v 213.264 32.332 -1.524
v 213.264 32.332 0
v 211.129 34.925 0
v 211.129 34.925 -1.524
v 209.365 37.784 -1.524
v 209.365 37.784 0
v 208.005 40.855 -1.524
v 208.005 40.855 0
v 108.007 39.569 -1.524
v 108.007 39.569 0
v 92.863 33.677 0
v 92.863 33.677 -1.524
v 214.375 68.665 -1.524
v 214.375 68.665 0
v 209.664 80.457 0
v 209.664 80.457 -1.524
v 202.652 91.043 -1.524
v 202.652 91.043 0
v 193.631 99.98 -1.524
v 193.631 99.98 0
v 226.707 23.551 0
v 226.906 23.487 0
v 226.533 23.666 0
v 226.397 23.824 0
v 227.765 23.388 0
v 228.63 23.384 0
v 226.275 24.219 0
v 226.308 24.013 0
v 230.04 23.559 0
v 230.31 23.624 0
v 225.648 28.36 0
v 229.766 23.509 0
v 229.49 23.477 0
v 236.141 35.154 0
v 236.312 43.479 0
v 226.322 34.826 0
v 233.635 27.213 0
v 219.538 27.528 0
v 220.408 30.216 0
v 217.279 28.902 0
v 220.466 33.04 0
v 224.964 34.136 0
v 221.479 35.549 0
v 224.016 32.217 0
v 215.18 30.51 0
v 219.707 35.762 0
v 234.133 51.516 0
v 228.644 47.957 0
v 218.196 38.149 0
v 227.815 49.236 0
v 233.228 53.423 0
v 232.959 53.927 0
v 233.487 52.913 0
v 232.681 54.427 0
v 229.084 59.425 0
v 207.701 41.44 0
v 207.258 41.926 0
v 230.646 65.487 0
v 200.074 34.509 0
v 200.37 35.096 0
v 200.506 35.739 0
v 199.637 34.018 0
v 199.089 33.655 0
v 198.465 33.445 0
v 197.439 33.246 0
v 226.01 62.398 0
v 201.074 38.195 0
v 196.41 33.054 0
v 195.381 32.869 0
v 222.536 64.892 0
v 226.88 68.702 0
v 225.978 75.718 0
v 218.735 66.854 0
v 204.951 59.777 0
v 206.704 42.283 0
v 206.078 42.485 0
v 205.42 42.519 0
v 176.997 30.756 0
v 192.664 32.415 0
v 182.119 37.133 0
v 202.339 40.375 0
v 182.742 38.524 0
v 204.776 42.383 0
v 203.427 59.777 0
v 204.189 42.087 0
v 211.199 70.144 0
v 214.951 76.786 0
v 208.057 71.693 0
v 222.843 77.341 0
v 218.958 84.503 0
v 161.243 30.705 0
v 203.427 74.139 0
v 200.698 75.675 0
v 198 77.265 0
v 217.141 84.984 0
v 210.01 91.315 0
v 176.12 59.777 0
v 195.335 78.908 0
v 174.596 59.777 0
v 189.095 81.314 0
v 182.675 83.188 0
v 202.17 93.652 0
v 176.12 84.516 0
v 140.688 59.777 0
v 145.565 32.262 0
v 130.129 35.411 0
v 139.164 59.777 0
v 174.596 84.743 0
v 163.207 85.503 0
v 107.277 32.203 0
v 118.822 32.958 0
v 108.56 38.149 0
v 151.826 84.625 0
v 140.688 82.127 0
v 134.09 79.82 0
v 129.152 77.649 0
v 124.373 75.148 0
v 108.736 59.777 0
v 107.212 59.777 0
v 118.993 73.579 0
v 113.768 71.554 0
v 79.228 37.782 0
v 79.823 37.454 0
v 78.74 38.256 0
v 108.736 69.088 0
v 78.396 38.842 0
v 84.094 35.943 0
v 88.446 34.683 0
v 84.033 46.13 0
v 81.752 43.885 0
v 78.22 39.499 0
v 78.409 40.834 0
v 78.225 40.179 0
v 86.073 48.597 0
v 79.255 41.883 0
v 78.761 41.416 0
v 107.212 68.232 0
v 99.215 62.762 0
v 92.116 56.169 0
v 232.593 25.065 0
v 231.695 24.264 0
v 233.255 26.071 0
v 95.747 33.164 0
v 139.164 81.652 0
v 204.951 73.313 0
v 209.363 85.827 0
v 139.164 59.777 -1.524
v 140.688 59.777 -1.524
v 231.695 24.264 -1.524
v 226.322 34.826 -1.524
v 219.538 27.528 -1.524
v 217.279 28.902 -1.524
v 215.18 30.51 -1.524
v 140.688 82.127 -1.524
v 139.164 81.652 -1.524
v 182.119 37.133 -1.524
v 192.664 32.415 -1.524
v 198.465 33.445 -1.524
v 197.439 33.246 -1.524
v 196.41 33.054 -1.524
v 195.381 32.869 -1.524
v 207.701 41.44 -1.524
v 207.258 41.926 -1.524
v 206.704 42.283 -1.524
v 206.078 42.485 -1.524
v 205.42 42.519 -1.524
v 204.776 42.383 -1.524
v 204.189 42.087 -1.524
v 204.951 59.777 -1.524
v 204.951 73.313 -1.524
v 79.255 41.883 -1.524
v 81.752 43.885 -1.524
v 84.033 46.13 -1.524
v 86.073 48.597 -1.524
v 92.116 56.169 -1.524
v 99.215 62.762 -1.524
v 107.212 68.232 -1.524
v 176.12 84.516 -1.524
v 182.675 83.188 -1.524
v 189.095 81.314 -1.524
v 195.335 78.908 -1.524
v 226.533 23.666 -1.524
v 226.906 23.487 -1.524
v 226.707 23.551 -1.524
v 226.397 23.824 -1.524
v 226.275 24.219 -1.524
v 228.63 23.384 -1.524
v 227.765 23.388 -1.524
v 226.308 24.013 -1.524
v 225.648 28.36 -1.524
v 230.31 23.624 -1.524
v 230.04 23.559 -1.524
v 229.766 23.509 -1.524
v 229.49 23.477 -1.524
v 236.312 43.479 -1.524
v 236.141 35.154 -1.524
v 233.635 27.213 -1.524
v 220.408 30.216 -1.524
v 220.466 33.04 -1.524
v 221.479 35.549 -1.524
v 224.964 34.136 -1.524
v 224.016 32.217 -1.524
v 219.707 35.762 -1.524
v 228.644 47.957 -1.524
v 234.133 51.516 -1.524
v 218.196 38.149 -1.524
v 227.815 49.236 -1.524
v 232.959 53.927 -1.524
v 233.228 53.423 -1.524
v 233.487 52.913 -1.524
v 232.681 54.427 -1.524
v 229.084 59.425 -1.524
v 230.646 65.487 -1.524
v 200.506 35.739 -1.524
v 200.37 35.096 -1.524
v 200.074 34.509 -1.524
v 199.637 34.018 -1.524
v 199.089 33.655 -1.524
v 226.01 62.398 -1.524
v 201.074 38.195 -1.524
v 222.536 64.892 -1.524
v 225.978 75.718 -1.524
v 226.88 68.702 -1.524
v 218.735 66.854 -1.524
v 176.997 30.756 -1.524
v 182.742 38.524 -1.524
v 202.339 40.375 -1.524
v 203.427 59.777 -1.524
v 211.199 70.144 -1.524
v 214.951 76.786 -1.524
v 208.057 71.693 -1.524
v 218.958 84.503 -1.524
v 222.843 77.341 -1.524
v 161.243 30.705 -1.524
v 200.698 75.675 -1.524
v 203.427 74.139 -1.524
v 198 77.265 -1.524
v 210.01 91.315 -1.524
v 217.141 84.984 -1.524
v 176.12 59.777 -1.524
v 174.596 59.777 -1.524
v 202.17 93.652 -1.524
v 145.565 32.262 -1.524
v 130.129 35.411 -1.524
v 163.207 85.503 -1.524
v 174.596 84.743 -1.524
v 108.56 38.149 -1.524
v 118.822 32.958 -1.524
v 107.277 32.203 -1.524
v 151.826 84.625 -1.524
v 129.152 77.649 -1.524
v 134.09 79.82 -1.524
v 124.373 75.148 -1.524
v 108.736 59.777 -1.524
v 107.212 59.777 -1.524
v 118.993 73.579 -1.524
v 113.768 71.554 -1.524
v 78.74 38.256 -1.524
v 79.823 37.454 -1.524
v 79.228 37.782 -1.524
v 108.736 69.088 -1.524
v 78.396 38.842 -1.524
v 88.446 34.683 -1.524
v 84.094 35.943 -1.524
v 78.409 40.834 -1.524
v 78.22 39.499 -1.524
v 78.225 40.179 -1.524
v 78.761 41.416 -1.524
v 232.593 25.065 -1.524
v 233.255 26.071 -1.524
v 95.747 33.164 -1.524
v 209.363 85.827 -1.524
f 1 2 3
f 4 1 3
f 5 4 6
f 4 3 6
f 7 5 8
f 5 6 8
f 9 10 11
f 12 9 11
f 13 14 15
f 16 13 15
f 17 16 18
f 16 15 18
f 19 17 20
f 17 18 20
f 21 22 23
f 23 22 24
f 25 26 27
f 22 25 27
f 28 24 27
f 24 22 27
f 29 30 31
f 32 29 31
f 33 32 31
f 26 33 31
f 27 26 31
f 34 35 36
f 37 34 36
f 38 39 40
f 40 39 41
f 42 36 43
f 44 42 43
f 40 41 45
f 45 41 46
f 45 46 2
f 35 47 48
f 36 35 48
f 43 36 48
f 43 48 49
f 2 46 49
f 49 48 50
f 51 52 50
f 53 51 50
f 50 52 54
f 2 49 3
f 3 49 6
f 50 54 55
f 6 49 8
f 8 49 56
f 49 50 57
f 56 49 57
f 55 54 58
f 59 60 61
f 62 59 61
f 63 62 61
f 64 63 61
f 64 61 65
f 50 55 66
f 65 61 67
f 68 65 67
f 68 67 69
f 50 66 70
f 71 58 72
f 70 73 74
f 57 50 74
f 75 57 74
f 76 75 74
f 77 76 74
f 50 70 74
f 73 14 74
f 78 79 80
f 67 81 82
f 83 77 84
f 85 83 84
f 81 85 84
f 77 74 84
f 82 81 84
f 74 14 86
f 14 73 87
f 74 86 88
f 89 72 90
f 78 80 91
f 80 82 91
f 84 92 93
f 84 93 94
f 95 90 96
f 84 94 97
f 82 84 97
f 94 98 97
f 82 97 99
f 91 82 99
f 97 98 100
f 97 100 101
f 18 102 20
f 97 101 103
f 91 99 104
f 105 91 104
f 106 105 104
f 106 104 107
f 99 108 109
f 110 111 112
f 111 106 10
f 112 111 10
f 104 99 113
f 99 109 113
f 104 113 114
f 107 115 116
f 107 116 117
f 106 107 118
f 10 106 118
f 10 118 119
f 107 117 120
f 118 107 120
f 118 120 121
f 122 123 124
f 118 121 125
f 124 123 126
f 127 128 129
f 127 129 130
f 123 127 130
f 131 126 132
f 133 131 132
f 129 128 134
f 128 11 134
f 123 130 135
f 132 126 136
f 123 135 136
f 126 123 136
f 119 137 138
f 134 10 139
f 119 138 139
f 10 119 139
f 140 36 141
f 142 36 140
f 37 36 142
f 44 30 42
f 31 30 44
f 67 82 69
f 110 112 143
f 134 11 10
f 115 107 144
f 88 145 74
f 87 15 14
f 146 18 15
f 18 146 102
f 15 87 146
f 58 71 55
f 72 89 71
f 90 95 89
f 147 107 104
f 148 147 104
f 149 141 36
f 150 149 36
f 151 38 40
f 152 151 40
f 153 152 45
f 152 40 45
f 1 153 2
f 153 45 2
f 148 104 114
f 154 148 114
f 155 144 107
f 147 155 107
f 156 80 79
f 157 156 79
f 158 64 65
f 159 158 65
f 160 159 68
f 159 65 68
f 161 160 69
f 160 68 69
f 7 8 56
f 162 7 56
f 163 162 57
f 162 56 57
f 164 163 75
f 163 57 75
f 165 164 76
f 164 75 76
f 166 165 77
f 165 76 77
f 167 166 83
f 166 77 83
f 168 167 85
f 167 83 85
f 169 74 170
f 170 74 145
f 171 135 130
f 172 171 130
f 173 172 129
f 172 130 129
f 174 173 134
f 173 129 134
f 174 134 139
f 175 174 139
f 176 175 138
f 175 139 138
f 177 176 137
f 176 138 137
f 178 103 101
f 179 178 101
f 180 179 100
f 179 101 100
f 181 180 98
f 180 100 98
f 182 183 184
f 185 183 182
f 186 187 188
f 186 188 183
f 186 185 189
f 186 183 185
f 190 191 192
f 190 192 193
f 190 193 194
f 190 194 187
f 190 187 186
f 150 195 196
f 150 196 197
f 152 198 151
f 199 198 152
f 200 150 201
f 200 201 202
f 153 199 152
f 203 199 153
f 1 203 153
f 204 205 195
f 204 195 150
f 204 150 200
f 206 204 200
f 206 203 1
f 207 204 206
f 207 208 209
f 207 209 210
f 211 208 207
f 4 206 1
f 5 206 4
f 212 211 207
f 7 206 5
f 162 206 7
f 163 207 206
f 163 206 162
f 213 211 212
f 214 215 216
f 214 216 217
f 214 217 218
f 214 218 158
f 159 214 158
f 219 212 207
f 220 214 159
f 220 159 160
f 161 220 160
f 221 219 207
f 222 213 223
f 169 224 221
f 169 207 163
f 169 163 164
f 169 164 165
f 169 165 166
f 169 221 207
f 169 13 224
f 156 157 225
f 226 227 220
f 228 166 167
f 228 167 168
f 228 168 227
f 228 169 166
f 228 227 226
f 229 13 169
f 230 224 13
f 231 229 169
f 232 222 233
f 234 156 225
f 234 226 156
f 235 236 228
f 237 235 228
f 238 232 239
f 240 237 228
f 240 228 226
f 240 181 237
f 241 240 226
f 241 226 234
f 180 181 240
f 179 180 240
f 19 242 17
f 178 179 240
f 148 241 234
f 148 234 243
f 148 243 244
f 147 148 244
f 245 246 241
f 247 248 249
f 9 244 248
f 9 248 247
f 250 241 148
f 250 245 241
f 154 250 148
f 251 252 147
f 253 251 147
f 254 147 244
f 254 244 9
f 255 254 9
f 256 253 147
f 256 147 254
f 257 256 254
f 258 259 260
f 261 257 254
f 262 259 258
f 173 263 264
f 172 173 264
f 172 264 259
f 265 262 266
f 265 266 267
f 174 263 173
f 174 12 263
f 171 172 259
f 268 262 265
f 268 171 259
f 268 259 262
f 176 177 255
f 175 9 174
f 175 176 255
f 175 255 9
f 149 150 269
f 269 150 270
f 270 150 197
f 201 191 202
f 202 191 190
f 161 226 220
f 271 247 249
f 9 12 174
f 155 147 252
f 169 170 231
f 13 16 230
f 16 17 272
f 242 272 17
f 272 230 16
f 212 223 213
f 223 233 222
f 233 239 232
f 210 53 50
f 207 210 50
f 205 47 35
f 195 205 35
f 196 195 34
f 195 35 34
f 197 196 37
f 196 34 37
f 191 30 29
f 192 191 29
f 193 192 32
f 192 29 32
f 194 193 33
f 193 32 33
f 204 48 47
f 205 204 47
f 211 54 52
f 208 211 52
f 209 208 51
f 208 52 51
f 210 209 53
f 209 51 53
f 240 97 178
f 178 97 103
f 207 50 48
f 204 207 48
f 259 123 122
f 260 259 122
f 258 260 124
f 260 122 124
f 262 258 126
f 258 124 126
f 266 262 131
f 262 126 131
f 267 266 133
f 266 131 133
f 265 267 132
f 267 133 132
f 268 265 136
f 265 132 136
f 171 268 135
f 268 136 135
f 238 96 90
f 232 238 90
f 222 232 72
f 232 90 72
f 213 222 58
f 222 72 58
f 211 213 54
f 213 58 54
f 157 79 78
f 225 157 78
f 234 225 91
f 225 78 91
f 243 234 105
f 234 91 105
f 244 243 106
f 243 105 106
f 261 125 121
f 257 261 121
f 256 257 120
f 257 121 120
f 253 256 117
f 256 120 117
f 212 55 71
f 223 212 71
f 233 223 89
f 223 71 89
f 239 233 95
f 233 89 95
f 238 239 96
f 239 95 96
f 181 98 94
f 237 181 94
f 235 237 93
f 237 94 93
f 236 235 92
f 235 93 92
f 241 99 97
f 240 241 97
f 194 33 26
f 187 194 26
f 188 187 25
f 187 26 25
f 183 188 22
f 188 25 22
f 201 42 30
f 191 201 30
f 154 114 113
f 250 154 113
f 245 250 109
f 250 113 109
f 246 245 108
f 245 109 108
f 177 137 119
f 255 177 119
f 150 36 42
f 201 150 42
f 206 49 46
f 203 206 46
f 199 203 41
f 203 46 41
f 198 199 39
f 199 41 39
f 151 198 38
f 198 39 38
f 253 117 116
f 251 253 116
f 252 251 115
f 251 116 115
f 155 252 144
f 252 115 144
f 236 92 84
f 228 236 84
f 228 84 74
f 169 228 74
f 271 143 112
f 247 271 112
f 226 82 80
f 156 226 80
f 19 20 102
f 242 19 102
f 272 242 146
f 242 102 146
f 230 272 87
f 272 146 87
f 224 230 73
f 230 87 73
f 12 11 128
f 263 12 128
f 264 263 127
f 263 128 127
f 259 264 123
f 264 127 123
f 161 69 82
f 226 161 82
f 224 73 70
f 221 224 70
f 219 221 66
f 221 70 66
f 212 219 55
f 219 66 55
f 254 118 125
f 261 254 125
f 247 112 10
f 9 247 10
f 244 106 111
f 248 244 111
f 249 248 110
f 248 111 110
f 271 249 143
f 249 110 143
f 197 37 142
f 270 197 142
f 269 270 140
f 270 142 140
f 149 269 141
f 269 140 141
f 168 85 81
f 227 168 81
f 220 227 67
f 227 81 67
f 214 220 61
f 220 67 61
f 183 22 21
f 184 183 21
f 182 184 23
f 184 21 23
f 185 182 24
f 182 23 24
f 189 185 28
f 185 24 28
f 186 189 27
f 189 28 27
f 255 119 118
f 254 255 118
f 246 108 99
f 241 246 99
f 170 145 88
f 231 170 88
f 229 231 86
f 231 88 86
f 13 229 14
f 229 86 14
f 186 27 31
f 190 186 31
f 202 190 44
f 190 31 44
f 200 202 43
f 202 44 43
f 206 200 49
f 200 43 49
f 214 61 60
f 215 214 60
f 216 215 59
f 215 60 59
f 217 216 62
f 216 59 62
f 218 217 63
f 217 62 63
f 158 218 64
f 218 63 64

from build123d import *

# Parameters (mm, degrees)
BASE_FLANGE1_DEPTH = 1.524


# Sheet-metal steps are written as plain solids
with BuildPart() as part:
    # Sketch1 → Base-Flange1 (new body)
    with BuildSketch(Plane.XY):
        with BuildLine():
            Line((231.694733782, 24.263932463), (226.322343195, 34.826415896))
            Line((226.322343195, 34.826415896), (224.963957286, 34.135500761))
            Line((224.963957286, 34.135500761), (230.310366707, 23.62409806))
            ThreePointArc((230.310366707, 23.62409806), (229.903279587, 23.531939933), (229.489552508, 23.476777012))
            ThreePointArc((229.489552508, 23.476777012), (228.197526273, 23.373669283), (226.906388141, 23.487358857))
            ThreePointArc((226.906388141, 23.487358857), (226.4596517, 23.740258206), (226.274712745, 24.219141398))
            ThreePointArc((226.274712745, 24.219141398), (224.015809297, 32.216773888), (218.195630565, 38.14891429))
            ThreePointArc((218.195630565, 38.14891429), (220.465583992, 33.0404298), (219.538231847, 27.527778863))
            ThreePointArc((219.538231847, 27.527778863), (216.207783845, 29.677782654), (213.263726879, 32.332387856))
            ThreePointArc((213.263726879, 32.332387856), (210.198099549, 36.324777472), (208.004537358, 40.855288557))
            ThreePointArc((208.004537358, 40.855288557), (206.39770053, 42.404093827), (204.188624103, 42.08675537))
            ThreePointArc((204.188624103, 42.08675537), (201.624892341, 39.331988443), (200.505863828, 35.739045838))
            ThreePointArc((200.505863828, 35.739045838), (199.871363088, 34.249097505), (198.465439283, 33.445408832))
            ThreePointArc((198.465439283, 33.445408832), (196.924665159, 33.149450023), (195.38095855, 32.869188678))
            Line((195.38095855, 32.869188678), (182.741679906, 38.523729549))
            Line((182.741679906, 38.523729549), (182.119318407, 37.132599733))
            Line((182.119318407, 37.132599733), (192.663920738, 32.415171901))
            ThreePointArc((192.663920738, 32.415171901), (161.242789348, 30.704605569), (130.128998565, 35.41051229))
            ThreePointArc((130.128998565, 35.41051229), (113.063651794, 32.366088022), (95.747230087, 33.163658602))
            Line((95.747230087, 33.163658602), (108.559818137, 38.14891429))
            Line((108.559818137, 38.14891429), (108.007201374, 39.569192683))
            Line((108.007201374, 39.569192683), (92.863162197, 33.67679162))
            ThreePointArc((92.863162197, 33.67679162), (86.261009295, 35.281159538), (79.823408008, 37.453648673))
            ThreePointArc((79.823408008, 37.453648673), (78.22024482, 39.499195708), (79.254639852, 41.883398257))
            ThreePointArc((79.254639852, 41.883398257), (82.921318742, 44.978245875), (86.072618329, 48.596522643))
            ThreePointArc((86.072618329, 48.596522643), (95.542941515, 59.597739927), (107.212145233, 68.231596978))
            Line((107.212145233, 68.231596978), (107.212145233, 59.777231813))
            Line((107.212145233, 59.777231813), (108.736145233, 59.777231813))
            Line((108.736145233, 59.777231813), (108.736145233, 69.088203695))
            ThreePointArc((108.736145233, 69.088203695), (116.359031122, 72.623035129), (124.373136037, 75.148415287))
            ThreePointArc((124.373136037, 75.148415287), (131.602965043, 78.776561047), (139.163891612, 81.651671224))
            Line((139.163891612, 81.651671224), (139.163891612, 59.777231813))
            Line((139.163891612, 59.777231813), (140.687891612, 59.777231813))
            Line((140.687891612, 59.777231813), (140.687891612, 82.127226165))
            ThreePointArc((140.687891612, 82.127226165), (157.500365841, 85.268581792), (174.595729834, 84.743286803))
            Line((174.595729834, 84.743286803), (174.595729834, 59.777231813))
            Line((174.595729834, 59.777231813), (176.119729834, 59.777231813))
            Line((176.119729834, 59.777231813), (176.119729834, 84.515885394))
            ThreePointArc((176.119729834, 84.515885394), (185.904383104, 82.318759277), (195.334831423, 78.907975308))
            ThreePointArc((195.334831423, 78.907975308), (199.345089693, 76.463216465), (203.426624103, 74.139406221))
            Line((203.426624103, 74.139406221), (203.426624103, 59.777231813))
            Line((203.426624103, 59.777231813), (204.950624103, 59.777231813))
            Line((204.950624103, 59.777231813), (204.950624103, 73.312546377))
            ThreePointArc((204.950624103, 73.312546377), (209.623865484, 70.909977098), (214.374828712, 68.665011052))
            ThreePointArc((214.374828712, 68.665011052), (206.4297978, 85.930083199), (193.631366333, 99.980221435))
            ThreePointArc((193.631366333, 99.980221435), (209.362770136, 85.826652744), (218.735162472, 66.854071628))
            ThreePointArc((218.735162472, 66.854071628), (224.318551803, 63.708956455), (229.084465035, 59.425026374))
            ThreePointArc((229.084465035, 59.425026374), (222.842822588, 77.340987602), (210.010472895, 91.314912193))
            ThreePointArc((210.010472895, 91.314912193), (225.977718367, 75.717609631), (232.680835608, 54.426837112))
            ThreePointArc((232.680835608, 54.426837112), (233.094865862, 53.67572934), (233.486730489, 52.912823022))
            Line((233.486730489, 52.912823022), (227.814771071, 49.235924899))
            Line((227.814771071, 49.235924899), (228.643767466, 47.957120387))
            Line((228.643767466, 47.957120387), (234.133478106, 51.515874121))
            ThreePointArc((234.133478106, 51.515874121), (236.523898696, 39.310516196), (233.635048327, 27.213433234))
            ThreePointArc((233.635048327, 27.213433234), (232.956717504, 25.546706257), (231.694733782, 24.263932463))
        make_face()
    extrude(amount=-BASE_FLANGE1_DEPTH)


solid = part.part
